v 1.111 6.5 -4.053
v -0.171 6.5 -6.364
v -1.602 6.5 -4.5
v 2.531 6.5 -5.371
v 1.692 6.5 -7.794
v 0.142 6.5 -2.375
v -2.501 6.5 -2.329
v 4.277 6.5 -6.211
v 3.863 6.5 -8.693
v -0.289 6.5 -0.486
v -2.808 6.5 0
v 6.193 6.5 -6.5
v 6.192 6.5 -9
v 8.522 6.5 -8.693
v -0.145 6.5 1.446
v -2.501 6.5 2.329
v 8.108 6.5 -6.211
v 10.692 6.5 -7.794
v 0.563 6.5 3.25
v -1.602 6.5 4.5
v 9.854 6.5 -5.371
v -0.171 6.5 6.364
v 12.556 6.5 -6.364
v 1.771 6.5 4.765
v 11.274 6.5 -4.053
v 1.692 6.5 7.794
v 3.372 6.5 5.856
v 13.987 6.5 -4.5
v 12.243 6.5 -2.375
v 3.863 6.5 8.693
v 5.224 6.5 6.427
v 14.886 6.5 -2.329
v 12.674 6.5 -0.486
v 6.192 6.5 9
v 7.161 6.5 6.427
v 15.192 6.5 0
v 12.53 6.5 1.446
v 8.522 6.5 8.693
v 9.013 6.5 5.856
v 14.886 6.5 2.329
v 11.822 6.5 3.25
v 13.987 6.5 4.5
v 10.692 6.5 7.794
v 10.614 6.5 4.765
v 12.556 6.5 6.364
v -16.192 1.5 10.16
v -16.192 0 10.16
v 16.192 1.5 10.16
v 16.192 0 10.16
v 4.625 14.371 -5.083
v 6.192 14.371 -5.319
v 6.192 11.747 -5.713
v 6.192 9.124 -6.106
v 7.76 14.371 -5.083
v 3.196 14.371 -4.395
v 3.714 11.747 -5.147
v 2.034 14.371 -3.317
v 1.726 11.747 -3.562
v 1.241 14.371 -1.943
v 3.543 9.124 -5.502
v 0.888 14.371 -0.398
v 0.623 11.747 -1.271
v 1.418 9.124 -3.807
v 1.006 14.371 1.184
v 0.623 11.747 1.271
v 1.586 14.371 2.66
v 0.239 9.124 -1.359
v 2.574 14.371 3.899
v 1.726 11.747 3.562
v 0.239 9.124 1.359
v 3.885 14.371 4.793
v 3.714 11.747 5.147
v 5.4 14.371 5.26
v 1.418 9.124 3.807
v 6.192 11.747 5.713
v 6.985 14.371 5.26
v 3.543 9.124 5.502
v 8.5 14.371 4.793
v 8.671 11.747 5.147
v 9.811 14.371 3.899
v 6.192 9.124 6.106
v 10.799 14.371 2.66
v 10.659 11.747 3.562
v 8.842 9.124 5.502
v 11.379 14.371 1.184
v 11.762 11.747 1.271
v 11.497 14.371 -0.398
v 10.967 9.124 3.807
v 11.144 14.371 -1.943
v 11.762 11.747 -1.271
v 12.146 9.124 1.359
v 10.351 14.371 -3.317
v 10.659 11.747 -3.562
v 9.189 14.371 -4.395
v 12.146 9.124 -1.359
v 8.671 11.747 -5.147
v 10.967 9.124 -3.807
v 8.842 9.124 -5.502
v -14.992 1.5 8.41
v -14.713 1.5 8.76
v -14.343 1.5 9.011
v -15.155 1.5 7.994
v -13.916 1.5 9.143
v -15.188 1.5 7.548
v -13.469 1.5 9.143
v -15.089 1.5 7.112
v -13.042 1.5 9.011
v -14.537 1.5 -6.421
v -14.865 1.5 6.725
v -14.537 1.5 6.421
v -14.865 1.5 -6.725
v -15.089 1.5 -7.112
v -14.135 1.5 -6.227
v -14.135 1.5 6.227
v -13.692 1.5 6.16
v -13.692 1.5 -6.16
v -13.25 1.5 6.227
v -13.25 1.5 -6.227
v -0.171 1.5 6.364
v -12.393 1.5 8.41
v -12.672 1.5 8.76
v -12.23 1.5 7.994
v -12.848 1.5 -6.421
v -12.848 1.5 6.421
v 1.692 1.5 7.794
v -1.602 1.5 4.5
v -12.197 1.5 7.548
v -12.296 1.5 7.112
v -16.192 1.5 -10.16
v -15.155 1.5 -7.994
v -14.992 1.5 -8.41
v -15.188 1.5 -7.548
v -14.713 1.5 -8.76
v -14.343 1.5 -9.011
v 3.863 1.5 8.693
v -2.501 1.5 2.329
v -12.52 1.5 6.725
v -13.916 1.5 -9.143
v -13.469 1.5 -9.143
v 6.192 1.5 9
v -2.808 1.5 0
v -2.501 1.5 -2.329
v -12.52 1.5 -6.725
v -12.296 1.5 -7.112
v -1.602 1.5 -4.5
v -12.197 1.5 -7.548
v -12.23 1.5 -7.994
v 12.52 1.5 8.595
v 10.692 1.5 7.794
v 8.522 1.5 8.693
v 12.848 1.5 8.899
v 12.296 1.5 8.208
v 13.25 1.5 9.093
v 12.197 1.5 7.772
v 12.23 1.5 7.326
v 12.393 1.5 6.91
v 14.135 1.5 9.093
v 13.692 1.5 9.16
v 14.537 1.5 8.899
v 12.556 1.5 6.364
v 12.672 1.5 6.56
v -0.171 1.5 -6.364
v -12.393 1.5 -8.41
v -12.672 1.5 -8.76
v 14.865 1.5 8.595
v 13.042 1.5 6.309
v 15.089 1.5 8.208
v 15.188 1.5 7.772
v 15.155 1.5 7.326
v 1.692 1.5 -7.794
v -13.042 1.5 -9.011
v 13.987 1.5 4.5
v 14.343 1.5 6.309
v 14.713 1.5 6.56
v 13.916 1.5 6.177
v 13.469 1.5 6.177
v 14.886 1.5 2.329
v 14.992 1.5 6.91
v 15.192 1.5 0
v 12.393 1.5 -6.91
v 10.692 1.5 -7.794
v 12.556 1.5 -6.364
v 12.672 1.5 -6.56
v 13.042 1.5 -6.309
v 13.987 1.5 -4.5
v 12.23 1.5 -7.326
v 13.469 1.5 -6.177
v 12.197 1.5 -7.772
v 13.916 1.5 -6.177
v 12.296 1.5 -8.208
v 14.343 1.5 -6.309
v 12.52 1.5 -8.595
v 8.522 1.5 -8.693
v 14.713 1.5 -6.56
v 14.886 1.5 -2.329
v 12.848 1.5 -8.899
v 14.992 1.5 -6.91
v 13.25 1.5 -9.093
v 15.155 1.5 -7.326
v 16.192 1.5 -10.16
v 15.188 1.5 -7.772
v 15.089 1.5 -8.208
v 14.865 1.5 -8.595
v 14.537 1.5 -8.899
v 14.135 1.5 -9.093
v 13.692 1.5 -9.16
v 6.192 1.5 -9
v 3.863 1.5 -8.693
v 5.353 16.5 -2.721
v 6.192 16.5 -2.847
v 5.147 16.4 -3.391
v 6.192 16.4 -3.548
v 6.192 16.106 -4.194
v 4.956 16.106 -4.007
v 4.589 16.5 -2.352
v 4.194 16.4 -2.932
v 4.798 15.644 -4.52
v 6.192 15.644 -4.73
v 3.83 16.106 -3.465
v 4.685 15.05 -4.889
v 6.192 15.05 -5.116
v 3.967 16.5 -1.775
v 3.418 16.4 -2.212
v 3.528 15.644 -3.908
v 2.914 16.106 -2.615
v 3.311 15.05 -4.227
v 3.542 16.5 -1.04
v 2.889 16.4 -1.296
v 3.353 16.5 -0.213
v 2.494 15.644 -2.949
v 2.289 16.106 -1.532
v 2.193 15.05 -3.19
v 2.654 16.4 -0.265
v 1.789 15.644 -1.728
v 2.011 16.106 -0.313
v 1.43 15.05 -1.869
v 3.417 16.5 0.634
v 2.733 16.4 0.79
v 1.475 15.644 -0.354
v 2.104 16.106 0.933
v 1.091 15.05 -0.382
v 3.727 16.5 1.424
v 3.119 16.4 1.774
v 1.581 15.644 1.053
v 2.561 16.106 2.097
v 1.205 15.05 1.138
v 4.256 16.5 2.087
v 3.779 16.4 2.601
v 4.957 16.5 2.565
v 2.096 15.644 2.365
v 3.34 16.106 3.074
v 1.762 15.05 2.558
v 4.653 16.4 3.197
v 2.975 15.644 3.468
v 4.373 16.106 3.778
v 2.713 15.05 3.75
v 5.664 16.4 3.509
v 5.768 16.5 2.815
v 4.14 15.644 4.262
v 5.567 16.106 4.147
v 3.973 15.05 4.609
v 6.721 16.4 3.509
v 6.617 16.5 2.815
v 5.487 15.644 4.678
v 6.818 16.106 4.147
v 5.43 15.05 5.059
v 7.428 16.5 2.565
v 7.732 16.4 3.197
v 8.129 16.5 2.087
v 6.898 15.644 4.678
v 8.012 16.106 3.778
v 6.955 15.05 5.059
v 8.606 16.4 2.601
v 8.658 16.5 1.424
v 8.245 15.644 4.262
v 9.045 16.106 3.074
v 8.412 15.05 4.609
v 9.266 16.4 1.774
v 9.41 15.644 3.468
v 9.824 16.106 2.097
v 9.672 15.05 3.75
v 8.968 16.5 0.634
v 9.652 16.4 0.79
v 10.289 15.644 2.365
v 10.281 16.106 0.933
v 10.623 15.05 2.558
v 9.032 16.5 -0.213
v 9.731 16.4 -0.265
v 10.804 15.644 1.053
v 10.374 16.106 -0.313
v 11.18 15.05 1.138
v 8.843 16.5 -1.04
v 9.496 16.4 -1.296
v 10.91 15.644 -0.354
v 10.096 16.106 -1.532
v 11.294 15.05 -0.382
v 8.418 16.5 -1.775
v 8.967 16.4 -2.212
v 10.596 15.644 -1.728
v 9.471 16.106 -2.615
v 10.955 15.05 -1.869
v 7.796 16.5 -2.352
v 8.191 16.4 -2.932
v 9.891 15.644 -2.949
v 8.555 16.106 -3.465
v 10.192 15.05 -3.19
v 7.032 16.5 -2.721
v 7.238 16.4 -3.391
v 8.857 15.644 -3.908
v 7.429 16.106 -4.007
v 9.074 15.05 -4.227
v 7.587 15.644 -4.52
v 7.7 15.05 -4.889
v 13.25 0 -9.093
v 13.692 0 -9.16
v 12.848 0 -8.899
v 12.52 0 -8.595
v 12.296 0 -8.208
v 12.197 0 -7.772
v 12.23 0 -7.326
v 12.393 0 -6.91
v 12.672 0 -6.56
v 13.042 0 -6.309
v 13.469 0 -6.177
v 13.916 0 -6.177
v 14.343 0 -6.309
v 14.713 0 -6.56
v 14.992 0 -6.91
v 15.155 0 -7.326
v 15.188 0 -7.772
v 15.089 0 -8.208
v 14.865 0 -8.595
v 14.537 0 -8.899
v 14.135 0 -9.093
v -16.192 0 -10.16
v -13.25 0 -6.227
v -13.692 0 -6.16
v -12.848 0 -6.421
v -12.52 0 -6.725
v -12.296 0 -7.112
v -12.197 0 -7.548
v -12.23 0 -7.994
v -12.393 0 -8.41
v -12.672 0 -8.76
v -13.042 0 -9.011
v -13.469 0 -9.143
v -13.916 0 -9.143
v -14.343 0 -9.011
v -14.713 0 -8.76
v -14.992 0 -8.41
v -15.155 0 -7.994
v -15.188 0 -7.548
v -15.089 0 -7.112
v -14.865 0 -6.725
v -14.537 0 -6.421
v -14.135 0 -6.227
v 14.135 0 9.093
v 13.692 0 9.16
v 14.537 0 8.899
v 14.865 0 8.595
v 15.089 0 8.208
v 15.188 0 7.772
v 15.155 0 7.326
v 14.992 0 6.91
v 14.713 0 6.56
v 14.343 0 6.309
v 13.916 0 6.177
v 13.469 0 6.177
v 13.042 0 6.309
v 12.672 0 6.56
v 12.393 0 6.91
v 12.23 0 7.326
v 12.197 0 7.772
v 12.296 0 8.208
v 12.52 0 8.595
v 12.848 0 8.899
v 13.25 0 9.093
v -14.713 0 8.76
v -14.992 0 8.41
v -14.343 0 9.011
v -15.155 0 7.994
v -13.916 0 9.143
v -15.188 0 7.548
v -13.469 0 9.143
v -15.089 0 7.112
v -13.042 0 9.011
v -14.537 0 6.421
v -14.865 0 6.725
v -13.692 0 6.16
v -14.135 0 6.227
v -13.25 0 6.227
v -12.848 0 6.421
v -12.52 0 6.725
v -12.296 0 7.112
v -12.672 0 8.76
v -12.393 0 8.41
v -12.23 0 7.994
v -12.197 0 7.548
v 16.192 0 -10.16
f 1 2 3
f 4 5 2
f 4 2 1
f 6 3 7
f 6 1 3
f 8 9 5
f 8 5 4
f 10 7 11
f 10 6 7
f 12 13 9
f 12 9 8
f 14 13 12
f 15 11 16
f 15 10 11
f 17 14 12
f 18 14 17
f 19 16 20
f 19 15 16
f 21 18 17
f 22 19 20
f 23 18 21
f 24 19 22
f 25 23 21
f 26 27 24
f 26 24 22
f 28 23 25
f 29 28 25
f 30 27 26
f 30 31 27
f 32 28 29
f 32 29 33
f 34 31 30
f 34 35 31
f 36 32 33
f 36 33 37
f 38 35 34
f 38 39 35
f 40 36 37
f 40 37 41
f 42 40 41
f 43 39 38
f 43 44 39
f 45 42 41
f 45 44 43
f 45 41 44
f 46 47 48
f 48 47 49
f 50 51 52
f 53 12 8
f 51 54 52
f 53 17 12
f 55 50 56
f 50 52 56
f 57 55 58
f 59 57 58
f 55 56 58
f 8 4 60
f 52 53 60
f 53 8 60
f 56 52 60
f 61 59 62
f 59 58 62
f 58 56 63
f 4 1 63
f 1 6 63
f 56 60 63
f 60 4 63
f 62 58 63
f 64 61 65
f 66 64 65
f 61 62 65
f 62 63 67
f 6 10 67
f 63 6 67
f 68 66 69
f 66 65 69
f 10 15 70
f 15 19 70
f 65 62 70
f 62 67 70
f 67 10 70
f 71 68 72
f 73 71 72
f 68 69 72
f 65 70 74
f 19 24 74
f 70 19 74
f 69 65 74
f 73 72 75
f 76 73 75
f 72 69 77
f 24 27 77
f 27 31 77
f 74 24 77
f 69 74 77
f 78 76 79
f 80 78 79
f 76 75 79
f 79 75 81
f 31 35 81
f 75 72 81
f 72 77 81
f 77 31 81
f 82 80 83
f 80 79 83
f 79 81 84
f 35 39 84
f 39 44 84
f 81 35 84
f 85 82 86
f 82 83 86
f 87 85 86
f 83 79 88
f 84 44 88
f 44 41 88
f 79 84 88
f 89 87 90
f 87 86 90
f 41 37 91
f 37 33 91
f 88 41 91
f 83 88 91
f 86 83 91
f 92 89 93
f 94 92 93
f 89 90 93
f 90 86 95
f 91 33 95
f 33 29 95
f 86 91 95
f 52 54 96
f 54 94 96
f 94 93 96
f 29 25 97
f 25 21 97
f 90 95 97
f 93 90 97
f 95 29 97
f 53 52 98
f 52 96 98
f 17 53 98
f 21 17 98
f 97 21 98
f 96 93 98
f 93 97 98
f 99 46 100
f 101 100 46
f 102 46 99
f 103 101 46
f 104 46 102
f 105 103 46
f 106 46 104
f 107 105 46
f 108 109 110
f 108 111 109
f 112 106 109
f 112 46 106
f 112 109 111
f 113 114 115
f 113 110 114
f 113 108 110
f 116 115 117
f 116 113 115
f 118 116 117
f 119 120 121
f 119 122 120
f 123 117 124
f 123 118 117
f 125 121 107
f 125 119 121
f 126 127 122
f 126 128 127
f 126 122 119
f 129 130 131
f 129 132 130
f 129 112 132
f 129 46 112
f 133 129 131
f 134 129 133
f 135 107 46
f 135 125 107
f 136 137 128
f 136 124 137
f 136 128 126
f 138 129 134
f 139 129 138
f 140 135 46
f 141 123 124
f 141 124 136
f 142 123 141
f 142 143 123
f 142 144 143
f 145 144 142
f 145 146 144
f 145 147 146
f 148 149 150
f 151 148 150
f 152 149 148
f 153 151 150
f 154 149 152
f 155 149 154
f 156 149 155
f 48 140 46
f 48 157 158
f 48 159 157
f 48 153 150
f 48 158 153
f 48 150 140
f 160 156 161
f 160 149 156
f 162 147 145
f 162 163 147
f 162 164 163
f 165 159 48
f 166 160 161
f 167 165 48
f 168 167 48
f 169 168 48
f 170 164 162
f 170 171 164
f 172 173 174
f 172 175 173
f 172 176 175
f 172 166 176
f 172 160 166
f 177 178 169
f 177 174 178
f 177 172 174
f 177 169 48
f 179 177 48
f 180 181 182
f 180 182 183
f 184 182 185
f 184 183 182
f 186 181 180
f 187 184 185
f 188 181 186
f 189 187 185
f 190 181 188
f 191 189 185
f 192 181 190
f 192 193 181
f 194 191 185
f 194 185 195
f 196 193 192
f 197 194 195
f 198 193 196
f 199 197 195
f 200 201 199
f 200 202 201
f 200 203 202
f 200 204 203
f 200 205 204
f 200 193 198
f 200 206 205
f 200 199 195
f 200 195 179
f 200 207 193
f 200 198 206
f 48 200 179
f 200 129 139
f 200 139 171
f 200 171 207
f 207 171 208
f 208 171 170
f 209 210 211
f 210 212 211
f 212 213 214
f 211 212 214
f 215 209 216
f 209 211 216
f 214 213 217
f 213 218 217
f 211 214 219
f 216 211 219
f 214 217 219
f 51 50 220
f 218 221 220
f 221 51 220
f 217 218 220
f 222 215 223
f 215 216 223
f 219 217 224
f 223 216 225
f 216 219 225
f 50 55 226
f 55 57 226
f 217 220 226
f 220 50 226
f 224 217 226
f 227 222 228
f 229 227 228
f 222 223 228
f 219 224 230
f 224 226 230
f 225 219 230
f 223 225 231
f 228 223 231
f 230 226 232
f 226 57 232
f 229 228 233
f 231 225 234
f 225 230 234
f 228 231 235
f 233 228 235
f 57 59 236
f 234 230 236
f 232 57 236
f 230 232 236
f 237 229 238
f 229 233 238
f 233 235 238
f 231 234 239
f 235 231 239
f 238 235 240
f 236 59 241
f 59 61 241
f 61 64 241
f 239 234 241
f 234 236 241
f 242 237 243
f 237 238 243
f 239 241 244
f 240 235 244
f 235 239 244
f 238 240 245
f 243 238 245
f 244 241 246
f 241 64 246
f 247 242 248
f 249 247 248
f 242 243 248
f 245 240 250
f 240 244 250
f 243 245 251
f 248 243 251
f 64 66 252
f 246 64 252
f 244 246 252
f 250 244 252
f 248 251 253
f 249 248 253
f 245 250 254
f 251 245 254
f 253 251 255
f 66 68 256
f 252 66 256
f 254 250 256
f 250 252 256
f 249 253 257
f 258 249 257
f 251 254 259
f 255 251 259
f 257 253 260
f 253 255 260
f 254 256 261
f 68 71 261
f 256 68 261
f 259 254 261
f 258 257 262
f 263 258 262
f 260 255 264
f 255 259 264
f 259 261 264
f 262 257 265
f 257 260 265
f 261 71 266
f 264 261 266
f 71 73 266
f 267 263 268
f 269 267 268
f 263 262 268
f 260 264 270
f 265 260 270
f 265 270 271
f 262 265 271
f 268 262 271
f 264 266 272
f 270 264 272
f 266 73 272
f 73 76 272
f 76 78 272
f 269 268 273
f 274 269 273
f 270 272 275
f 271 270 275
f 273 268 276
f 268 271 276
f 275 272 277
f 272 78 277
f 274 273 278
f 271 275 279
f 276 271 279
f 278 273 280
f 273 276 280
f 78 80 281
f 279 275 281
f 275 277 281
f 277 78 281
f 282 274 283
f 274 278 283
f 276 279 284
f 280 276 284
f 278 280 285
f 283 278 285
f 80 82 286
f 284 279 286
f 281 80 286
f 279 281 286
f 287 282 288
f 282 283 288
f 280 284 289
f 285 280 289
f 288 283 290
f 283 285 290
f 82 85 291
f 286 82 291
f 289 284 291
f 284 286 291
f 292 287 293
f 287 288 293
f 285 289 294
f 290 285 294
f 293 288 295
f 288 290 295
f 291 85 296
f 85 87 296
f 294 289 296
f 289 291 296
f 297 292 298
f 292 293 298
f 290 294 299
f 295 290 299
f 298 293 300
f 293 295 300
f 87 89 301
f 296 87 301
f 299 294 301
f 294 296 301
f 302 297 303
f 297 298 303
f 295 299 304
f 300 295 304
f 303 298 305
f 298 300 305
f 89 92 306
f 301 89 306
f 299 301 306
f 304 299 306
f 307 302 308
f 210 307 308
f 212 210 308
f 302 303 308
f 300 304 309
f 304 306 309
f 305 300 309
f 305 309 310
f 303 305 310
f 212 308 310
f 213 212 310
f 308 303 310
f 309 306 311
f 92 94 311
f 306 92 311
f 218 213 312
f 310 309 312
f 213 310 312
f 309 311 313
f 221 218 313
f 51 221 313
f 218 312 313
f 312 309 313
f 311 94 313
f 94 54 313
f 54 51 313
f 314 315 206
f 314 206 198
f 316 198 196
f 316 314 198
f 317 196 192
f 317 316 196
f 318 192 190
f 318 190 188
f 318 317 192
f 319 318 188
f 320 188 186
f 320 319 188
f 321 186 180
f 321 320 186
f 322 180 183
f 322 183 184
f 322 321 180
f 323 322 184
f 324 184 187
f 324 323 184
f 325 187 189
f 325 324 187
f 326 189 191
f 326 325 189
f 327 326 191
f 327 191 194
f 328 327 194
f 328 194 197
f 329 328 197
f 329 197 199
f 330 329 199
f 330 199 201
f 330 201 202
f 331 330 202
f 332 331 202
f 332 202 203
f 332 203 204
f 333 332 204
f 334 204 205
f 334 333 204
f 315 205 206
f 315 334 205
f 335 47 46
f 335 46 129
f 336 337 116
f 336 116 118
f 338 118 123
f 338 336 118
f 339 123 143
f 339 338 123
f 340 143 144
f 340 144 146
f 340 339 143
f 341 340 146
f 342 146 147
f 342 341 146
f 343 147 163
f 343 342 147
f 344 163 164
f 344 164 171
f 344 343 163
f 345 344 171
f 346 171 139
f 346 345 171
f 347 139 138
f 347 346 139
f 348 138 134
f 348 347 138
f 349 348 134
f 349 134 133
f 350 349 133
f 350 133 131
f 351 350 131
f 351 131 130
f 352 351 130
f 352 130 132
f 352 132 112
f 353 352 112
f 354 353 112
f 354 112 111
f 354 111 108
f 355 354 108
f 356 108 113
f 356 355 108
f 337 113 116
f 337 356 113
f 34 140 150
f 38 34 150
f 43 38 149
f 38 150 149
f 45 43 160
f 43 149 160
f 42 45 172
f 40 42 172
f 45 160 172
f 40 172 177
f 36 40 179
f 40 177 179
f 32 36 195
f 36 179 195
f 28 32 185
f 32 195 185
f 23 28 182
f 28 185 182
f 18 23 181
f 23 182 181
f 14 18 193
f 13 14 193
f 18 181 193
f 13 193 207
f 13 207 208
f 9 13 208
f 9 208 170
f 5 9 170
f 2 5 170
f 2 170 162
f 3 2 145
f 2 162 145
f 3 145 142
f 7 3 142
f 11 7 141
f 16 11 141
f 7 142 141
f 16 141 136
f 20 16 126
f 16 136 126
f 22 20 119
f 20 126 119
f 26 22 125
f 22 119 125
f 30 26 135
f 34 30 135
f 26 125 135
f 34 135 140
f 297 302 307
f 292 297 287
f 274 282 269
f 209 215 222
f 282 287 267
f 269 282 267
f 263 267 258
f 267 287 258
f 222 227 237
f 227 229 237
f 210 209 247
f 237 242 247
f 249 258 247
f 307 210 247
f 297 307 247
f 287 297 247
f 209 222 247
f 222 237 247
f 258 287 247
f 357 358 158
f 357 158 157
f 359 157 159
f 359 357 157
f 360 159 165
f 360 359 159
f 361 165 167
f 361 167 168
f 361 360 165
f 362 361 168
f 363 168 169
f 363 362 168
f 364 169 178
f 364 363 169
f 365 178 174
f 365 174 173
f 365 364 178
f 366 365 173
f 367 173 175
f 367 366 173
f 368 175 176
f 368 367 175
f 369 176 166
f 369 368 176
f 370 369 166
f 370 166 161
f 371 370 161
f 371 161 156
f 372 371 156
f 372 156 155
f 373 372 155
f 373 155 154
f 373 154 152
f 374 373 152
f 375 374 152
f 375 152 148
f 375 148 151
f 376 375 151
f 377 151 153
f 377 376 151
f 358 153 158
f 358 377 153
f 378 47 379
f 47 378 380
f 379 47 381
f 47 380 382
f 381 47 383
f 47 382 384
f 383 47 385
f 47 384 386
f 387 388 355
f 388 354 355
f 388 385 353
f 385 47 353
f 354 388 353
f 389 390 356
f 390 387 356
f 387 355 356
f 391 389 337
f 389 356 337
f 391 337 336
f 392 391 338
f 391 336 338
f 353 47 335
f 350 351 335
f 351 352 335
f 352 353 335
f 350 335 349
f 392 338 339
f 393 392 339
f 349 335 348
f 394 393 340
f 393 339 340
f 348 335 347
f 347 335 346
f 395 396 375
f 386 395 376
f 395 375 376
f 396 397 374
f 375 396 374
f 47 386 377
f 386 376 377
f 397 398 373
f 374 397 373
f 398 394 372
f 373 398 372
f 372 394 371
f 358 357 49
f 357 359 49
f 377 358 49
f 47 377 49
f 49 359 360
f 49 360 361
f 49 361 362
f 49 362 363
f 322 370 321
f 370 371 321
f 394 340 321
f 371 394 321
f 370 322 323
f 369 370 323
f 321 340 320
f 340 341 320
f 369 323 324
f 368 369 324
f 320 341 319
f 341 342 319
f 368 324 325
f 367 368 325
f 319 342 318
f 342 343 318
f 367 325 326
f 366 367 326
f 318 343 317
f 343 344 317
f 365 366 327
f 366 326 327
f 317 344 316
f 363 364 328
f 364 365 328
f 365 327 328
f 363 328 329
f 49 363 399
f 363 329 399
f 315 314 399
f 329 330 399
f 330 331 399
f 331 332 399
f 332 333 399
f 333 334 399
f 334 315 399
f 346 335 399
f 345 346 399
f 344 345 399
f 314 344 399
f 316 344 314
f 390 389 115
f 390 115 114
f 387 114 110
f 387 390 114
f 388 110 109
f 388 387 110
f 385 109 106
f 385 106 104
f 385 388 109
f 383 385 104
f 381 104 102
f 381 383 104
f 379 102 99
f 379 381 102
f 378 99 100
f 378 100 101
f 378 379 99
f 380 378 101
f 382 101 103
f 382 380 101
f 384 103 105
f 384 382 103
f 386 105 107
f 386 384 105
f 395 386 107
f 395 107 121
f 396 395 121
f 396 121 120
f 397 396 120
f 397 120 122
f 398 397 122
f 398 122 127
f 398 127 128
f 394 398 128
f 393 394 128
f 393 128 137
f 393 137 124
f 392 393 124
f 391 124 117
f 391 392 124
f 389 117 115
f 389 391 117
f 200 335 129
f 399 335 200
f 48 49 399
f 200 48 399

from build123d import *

# Parameters (mm, degrees)
SKETCH1_W           = 32.385
SKETCH1_H           = 20.32
SKETCH1_R           = 1.5
BOSS_EXTRUDE1_DEPTH = 1.5
SKETCH2_R           = 9
BOSS_EXTRUDE2_DEPTH = 5


with BuildPart() as part:
    # Sketch1 → Boss-Extrude1 (new body)
    with BuildSketch(Plane(origin=(0, 0, 0), x_dir=(1, 0, 0), z_dir=(0, 1, 0))):
        Rectangle(SKETCH1_W, SKETCH1_H)
        with Locations(Location((-13.6925, 7.66, 0), (0, 0, 270))):
            Circle(SKETCH1_R, mode=Mode.SUBTRACT)
        with Locations(Location((13.6925, 7.66, 0), (0, 0, 90))):
            Circle(SKETCH1_R, mode=Mode.SUBTRACT)
        with Locations(Location((13.6925, -7.66, 0), (0, 0, 270))):
            Circle(SKETCH1_R, mode=Mode.SUBTRACT)
        with Locations(Location((-13.6925, -7.66, 0), (0, 0, 90))):
            Circle(SKETCH1_R, mode=Mode.SUBTRACT)
    extrude(amount=BOSS_EXTRUDE1_DEPTH)

    # Sketch2 → Boss-Extrude2 (add)
    with BuildSketch(Plane(origin=(0, 1.5, 0), x_dir=(1, 0, 0), z_dir=(0, 1, 0))):
        with Locations(Location((6.1925, 0, 0), (0, 0, 270))):
            Circle(SKETCH2_R)
    extrude(amount=BOSS_EXTRUDE2_DEPTH)

    # Sketch3 → Revolve1 (revolve)
    with BuildSketch(Plane.XY, mode=Mode.PRIVATE) as revolve1_sk:
        with BuildLine():
            Line((6.1925, 6.5), (6.1925, 16.5))
            Line((6.1925, 16.5), (9.039531448, 16.5))
            ThreePointArc((9.039531448, 16.5), (10.670922292, 15.894350526), (11.51187233, 14.370851132))
            Line((11.51187233, 14.370851132), (12.6925, 6.5))
            Line((12.6925, 6.5), (6.1925, 6.5))
        make_face()
    revolve(revolve1_sk.sketch.rotate(Axis((6.1925, 6.5, 0), (0, 1, 0)), 90), axis=Axis((6.1925, 6.5, 0), (0, 1, 0)))


solid = part.part
